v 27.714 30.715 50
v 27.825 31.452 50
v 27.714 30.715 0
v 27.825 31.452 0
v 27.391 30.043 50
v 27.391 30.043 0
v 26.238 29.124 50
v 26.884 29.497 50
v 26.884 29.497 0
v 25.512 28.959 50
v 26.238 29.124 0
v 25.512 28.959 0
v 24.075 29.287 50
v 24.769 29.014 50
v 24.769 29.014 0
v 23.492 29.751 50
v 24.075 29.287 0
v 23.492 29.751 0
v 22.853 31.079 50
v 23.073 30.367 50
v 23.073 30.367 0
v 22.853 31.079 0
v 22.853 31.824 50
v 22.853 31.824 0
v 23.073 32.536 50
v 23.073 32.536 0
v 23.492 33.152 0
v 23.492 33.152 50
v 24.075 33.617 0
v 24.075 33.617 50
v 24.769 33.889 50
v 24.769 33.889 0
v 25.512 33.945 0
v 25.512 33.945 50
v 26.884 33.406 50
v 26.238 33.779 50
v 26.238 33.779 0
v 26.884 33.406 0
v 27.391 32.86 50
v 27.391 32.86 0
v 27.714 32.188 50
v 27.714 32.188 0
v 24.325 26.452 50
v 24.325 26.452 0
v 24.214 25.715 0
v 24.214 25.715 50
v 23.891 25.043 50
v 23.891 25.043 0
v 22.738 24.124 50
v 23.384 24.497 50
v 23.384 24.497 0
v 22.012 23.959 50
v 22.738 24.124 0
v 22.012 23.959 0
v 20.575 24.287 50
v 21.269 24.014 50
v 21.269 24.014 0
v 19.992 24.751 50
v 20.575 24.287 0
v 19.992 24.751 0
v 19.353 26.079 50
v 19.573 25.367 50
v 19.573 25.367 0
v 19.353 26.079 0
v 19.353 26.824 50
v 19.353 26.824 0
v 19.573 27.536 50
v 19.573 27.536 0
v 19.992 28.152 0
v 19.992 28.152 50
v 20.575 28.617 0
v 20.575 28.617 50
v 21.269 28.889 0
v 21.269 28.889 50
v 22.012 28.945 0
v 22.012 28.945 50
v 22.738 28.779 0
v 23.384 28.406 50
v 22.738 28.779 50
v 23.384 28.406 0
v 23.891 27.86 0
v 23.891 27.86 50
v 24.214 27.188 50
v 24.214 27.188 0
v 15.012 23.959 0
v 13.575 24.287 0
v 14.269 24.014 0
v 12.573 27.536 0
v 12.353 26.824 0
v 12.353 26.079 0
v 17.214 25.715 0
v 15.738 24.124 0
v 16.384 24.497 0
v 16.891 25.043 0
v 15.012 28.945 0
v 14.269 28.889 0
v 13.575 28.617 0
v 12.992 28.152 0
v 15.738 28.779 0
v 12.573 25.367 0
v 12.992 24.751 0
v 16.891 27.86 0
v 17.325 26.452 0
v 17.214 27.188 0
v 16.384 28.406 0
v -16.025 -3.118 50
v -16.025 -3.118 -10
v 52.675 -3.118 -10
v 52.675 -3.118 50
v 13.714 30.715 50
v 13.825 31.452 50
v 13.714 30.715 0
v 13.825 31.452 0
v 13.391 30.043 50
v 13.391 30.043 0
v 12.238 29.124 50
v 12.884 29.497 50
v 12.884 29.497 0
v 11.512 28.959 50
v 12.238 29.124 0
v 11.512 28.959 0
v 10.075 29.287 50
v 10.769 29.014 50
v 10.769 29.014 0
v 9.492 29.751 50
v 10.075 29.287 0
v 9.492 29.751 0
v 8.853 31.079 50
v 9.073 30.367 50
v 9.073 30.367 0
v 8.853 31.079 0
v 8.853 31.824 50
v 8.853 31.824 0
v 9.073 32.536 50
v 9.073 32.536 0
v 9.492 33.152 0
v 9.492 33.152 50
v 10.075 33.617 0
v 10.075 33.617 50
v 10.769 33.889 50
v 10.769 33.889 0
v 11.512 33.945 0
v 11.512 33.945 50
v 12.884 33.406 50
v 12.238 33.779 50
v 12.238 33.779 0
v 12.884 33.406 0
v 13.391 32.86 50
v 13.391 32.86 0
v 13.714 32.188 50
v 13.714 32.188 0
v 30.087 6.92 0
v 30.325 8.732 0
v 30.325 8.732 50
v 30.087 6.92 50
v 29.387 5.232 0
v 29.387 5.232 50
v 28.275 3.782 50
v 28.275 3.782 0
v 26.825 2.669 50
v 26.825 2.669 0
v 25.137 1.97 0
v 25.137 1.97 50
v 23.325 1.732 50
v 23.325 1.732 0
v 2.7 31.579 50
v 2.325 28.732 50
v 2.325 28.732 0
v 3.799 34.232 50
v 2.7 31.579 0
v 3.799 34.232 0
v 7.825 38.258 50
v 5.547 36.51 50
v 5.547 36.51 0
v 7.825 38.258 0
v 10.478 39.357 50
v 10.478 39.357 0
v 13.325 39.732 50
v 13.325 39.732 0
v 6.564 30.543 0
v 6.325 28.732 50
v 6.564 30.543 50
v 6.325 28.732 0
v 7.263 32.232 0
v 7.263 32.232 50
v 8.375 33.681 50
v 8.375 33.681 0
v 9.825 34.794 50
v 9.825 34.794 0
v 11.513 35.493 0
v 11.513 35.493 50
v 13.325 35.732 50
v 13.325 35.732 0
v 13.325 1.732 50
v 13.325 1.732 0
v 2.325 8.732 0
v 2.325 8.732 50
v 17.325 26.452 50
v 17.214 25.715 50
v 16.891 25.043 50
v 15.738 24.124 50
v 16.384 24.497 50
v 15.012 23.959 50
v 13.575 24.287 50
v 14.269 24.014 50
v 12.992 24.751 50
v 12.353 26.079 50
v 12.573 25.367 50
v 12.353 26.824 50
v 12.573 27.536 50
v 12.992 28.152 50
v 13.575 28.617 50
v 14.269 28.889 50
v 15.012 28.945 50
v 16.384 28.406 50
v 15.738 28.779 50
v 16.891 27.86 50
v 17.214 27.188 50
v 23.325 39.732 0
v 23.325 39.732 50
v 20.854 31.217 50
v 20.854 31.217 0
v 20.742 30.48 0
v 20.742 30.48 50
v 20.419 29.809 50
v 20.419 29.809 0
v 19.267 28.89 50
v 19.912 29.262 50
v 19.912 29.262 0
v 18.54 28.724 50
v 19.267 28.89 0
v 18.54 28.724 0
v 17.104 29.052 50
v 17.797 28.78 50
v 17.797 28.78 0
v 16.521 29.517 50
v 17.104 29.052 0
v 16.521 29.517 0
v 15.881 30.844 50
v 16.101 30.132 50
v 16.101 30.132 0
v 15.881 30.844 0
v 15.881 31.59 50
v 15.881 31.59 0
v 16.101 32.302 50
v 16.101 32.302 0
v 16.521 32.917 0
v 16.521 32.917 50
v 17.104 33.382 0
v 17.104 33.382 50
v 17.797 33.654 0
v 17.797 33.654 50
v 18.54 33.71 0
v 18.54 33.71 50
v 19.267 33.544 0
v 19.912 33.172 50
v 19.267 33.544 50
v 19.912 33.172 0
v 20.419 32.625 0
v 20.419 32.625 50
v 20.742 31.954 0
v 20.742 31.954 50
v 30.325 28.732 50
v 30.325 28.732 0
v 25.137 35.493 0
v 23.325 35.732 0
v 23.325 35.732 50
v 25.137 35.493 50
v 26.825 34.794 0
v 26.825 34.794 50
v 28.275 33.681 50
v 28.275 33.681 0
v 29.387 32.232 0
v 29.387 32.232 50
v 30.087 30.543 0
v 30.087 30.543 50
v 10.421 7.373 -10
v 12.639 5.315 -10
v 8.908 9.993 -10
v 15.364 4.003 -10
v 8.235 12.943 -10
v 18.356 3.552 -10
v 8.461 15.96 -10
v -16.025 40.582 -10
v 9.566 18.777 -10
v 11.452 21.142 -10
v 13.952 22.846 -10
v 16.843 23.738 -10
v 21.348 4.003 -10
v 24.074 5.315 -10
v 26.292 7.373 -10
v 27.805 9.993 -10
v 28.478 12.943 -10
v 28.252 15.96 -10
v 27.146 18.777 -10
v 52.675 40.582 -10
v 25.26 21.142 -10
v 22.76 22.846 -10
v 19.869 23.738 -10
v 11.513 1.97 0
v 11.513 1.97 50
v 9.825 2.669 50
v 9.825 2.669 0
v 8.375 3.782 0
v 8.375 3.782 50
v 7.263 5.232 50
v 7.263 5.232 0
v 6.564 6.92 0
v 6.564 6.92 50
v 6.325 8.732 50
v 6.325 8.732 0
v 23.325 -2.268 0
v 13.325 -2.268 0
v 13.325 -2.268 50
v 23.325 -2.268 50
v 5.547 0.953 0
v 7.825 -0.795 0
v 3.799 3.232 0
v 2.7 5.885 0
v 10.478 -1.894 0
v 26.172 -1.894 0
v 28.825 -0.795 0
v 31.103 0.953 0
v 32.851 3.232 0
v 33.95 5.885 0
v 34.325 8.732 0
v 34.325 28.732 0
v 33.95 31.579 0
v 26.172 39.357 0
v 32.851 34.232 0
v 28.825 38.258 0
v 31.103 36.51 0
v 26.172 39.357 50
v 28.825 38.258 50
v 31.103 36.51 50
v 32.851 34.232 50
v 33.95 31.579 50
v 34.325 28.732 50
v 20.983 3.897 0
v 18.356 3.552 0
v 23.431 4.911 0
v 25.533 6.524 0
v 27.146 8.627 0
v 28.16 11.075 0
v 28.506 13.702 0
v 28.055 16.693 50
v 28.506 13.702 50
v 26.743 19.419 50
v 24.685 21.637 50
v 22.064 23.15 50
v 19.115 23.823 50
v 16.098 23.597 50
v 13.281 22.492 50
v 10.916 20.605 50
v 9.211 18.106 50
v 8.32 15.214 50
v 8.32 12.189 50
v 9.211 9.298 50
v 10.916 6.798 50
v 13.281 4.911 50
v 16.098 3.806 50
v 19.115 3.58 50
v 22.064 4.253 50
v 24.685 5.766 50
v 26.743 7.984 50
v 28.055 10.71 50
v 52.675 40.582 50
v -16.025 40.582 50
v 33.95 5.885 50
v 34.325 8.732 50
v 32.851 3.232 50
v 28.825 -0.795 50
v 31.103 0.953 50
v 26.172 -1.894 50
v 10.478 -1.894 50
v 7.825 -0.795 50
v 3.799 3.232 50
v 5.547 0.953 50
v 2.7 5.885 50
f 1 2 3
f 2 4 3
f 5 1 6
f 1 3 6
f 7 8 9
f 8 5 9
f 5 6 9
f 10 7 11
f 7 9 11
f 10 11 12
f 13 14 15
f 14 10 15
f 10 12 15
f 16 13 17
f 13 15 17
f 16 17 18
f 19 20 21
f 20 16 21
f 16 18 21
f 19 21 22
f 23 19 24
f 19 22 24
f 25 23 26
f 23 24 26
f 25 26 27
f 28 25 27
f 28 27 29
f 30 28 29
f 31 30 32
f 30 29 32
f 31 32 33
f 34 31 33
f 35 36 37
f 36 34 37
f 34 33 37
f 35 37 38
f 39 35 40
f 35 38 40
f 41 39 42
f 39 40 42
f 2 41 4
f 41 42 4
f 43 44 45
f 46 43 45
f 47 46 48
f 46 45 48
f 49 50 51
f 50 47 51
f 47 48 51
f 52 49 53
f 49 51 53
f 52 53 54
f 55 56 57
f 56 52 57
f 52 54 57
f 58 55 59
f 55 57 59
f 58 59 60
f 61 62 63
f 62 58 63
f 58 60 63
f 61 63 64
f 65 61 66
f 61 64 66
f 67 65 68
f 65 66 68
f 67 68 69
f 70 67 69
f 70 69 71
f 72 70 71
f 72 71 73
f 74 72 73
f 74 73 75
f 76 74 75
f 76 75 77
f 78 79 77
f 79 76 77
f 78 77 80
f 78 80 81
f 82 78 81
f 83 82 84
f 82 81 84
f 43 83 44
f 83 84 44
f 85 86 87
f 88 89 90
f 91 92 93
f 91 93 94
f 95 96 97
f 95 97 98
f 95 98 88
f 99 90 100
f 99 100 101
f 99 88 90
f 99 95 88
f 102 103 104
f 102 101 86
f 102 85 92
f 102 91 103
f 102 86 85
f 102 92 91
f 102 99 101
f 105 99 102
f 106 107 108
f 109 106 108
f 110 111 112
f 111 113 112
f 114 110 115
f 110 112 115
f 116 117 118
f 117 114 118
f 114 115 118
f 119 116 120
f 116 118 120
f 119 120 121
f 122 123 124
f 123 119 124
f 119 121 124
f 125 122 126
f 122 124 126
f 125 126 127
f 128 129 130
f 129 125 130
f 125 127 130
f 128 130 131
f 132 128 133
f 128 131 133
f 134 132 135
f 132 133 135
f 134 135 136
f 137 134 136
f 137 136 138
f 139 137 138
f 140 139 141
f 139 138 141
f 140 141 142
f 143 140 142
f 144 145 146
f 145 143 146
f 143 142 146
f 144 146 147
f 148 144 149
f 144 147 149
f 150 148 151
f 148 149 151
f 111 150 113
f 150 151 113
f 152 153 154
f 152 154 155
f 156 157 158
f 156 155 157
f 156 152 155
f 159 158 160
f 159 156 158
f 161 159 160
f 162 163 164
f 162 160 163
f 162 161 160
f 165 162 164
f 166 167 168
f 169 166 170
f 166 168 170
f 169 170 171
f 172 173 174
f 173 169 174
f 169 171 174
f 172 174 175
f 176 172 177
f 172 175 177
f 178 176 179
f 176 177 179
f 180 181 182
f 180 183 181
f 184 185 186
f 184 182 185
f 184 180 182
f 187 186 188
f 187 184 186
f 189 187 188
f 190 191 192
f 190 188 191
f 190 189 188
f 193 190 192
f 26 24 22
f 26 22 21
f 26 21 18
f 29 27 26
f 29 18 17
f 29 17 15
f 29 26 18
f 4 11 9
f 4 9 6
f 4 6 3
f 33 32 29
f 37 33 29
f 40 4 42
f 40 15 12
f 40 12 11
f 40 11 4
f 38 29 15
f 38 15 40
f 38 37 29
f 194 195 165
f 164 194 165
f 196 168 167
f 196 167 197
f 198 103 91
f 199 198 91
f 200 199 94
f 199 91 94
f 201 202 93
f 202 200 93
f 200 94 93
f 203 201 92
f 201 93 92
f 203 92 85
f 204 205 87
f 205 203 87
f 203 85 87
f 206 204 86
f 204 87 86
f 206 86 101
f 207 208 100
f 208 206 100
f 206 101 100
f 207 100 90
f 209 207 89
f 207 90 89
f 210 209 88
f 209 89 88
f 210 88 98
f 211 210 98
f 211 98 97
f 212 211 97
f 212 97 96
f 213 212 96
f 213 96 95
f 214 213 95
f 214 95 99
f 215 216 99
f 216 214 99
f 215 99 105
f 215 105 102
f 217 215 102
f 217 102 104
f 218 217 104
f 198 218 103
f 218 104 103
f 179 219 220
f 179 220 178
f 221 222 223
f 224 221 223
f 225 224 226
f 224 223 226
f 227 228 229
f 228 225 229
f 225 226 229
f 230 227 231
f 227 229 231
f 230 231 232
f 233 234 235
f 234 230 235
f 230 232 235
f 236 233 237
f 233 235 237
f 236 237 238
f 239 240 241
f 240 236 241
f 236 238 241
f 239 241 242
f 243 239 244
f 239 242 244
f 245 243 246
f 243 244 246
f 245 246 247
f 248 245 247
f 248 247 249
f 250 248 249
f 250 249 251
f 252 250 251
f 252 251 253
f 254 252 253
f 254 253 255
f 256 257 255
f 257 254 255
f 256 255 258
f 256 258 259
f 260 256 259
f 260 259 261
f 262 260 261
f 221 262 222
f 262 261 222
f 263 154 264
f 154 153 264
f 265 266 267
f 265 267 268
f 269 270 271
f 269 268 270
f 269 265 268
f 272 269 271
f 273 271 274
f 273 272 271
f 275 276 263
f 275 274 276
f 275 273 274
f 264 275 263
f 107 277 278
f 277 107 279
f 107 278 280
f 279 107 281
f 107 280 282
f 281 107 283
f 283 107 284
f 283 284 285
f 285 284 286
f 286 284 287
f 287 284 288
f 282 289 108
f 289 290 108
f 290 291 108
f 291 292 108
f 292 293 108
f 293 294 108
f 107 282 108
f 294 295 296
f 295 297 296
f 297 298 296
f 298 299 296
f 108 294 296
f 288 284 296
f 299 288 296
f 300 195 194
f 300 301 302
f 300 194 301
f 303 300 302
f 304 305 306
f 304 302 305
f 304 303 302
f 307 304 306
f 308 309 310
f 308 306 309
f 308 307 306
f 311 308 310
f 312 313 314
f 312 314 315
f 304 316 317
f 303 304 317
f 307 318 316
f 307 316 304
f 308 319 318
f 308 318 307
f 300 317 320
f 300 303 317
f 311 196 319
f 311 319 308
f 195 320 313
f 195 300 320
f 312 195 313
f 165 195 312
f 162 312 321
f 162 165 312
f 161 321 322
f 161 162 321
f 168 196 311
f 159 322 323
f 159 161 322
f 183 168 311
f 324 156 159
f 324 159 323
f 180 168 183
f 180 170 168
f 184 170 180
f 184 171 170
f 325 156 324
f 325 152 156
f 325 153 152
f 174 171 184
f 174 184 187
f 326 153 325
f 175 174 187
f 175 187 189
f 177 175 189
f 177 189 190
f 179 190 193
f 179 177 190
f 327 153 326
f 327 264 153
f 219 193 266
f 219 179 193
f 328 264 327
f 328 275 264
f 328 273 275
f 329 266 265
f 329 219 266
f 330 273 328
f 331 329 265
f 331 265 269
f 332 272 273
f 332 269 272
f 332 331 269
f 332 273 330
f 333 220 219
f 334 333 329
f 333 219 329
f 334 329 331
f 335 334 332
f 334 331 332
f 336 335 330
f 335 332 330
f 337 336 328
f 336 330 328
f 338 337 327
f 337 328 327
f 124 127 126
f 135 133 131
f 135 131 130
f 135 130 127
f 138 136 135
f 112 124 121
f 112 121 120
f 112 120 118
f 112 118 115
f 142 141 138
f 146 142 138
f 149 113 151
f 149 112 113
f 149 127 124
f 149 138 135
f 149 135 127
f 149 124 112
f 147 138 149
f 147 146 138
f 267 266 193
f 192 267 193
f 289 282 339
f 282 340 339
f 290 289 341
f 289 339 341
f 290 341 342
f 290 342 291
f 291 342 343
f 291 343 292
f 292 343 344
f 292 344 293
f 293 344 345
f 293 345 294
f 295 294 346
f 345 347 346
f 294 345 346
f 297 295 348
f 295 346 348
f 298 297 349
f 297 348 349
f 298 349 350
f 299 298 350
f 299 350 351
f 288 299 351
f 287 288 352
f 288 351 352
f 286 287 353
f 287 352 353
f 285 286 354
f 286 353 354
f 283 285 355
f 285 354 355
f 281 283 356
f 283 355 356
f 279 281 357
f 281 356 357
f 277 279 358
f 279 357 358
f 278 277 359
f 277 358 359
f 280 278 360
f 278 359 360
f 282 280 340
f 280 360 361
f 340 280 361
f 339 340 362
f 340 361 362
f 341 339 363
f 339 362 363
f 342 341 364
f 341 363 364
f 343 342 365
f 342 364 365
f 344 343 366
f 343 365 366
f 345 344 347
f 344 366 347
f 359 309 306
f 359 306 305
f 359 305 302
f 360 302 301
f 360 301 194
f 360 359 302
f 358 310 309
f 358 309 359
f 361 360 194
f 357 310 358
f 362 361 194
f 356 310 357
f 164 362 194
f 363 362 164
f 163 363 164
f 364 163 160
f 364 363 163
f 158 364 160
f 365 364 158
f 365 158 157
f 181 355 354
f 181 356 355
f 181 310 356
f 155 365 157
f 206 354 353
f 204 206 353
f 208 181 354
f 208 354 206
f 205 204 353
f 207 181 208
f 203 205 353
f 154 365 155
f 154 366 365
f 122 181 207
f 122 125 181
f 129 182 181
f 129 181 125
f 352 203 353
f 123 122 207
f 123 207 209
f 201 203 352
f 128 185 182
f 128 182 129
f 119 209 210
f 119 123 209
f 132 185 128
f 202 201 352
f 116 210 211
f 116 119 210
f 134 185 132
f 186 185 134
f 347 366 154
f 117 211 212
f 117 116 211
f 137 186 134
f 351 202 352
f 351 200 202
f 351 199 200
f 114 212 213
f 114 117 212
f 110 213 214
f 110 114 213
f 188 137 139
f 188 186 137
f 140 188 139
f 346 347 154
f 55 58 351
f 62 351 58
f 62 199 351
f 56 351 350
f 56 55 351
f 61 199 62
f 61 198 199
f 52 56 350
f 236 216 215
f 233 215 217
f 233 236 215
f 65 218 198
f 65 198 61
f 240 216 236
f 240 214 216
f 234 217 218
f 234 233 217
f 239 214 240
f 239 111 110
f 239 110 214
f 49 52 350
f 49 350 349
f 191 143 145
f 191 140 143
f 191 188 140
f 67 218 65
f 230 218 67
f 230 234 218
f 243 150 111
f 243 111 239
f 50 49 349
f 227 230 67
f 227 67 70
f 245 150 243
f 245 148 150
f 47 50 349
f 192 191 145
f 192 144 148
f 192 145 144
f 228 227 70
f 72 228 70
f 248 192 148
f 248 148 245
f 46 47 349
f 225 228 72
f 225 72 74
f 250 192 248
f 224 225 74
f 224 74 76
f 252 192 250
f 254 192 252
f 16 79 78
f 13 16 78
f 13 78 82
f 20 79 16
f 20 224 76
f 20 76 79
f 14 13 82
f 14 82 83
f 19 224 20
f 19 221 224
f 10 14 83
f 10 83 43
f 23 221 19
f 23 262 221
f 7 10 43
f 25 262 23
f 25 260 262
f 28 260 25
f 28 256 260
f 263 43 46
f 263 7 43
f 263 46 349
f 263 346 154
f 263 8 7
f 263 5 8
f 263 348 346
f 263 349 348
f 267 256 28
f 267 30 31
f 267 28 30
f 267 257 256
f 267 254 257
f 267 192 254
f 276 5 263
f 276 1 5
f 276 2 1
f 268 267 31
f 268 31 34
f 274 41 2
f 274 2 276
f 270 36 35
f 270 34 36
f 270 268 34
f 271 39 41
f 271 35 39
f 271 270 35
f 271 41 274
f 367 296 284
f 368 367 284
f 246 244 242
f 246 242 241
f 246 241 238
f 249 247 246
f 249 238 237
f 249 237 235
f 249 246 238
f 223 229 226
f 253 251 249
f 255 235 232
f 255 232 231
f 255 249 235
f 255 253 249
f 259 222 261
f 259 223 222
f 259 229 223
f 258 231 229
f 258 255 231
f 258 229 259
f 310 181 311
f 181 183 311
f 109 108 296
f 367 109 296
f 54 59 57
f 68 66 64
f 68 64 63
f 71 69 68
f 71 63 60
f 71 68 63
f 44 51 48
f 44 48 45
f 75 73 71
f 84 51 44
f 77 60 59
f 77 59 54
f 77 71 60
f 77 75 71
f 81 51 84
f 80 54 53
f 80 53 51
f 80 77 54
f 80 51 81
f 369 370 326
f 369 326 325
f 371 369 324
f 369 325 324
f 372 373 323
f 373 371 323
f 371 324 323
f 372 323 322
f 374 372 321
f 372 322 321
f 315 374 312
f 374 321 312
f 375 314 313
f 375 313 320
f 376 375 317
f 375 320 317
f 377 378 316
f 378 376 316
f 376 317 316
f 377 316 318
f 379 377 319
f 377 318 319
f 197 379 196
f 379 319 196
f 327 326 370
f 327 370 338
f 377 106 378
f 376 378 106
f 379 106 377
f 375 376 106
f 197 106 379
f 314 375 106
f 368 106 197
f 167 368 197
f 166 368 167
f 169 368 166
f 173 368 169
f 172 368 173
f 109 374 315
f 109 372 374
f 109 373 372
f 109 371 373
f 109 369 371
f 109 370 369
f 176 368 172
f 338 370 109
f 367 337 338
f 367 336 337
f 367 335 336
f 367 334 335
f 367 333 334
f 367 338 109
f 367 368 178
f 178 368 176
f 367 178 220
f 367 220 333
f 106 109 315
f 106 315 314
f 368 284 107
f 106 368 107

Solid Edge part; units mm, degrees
sketch "Sketch1" plane through (0, 0, 0) normal (0, 0, 1) x (1, 0, 0)
  line L0 (30.3251, 8.7316) -> (30.3251, 28.7316)
  arc A0 (30.3251, 28.7316) -> (23.3251, 35.7316) centre (23.3251, 28.7316) ccw
  line L1 (23.3251, 35.7316) -> (13.3251, 35.7316)
  arc A1 (13.3251, 35.7316) -> (6.3251, 28.7316) centre (13.3251, 28.7316) ccw
  line L2 (6.3251, 28.7316) -> (6.3251, 8.7316)
  arc A2 (6.3251, 8.7316) -> (13.3251, 1.7316) centre (13.3251, 8.7316) ccw
  line L3 (13.3251, 1.7316) -> (23.3251, 1.7316)
  arc A3 (23.3251, 1.7316) -> (30.3251, 8.7316) centre (23.3251, 8.7316) ccw
  line L4 (52.6751, 40.5816) -> (-16.0249, 40.5816)
  line L5 (-16.0249, 40.5816) -> (-16.0249, -3.1184)
  line L6 (-16.0249, -3.1184) -> (52.6751, -3.1184)
  line L7 (52.6751, -3.1184) -> (52.6751, 40.5816)
  circle A4 centre (14.8251, 26.4516) radius 2.5
  circle A5 centre (25.3251, 31.4516) radius 2.5
  circle A6 centre (21.8251, 26.4516) radius 2.5
  circle A7 centre (18.3562, 13.7016) radius 10.15
  line L8 (18.3251, 23.8516) -> (18.3251, 23.8515) construction
  line L9 (18.3562, 23.8516) -> (18.3251, 23.8516) construction
  circle A8 centre (18.3535, 31.217) radius 2.5
  circle A9 centre (11.3251, 31.4516) radius 2.5
  line L10 (23.3251, 39.7316) -> (13.3251, 39.7316)
  arc A10 (13.3251, 39.7316) -> (2.3251, 28.7316) centre (13.3251, 28.7316) ccw
  line L11 (2.3251, 28.7316) -> (2.3251, 8.7316)
  arc A11 (2.3251, 8.7316) -> (13.3251, -2.2684) centre (13.3251, 8.7316) ccw
  line L12 (13.3251, -2.2684) -> (23.3251, -2.2684)
  arc A12 (23.3251, -2.2684) -> (34.3251, 8.7316) centre (23.3251, 8.7316) ccw
  line L13 (34.3251, 8.7316) -> (34.3251, 28.7316)
  arc A13 (34.3251, 28.7316) -> (23.3251, 39.7316) centre (23.3251, 28.7316) ccw
  dimension "D1" = 40
  dimension "D2" = 30
  dimension "D3" = 2
  dimension "D4" = 3.5
  dimension "D5" = 3.5
  dimension "D6" = 7
  dimension "D7" = 7
extrude "Protrusion1" add sketch "Sketch1" along normal blind 50
sketch "Sketch2" plane through (0, 0, 0) normal (0, 0, 1) x (1, 0, 0)
  line L0 (52.6751, 40.5816) -> (-16.0249, 40.5816)
  line L1 (-16.0249, 40.5816) -> (-16.0249, -3.1184)
  line L2 (-16.0249, -3.1184) -> (52.6751, -3.1184)
  line L3 (52.6751, -3.1184) -> (52.6751, 40.5816)
extrude "Protrusion2" add sketch "Sketch2" against normal blind 10
sketch "Sketch3" plane through (18.3562, 13.7016, 0) normal (0, 0, 1) x (0, -1, 0)
  circle A0 centre (0, 0) radius 10.15
extrude "Cutout1" cut sketch "Sketch3" against normal blind 780
